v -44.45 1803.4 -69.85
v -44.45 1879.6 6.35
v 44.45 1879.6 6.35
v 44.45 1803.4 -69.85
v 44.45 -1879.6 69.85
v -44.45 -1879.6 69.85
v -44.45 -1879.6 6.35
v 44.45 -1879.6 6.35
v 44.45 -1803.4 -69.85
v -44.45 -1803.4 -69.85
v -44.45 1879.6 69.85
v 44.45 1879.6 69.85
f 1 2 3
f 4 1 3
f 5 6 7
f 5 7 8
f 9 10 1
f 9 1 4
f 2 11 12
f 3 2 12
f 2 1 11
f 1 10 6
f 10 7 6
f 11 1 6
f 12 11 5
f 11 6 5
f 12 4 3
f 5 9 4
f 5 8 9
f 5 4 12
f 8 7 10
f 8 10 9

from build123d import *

# Parameters (mm, degrees)
F0_W     = 88.9
F0_H     = 139.7
F1_DEPTH = 1879.6
F2_SIZE  = 76.2


with BuildPart() as f1:
    # F0 (on Front) → F1 (new body, symmetric)
    with BuildSketch(Plane.XZ):
        Rectangle(F0_W, F0_H)
    extrude(amount=F1_DEPTH, both=True)

    # F2
    f2_edges = [f1.edges().sort_by_distance(p)[0] for p in [
        (0, -1879.6, -69.85),
        (0, 1879.6, -69.85),
    ]]
    chamfer(f2_edges, length=F2_SIZE)


solid = f1.part
